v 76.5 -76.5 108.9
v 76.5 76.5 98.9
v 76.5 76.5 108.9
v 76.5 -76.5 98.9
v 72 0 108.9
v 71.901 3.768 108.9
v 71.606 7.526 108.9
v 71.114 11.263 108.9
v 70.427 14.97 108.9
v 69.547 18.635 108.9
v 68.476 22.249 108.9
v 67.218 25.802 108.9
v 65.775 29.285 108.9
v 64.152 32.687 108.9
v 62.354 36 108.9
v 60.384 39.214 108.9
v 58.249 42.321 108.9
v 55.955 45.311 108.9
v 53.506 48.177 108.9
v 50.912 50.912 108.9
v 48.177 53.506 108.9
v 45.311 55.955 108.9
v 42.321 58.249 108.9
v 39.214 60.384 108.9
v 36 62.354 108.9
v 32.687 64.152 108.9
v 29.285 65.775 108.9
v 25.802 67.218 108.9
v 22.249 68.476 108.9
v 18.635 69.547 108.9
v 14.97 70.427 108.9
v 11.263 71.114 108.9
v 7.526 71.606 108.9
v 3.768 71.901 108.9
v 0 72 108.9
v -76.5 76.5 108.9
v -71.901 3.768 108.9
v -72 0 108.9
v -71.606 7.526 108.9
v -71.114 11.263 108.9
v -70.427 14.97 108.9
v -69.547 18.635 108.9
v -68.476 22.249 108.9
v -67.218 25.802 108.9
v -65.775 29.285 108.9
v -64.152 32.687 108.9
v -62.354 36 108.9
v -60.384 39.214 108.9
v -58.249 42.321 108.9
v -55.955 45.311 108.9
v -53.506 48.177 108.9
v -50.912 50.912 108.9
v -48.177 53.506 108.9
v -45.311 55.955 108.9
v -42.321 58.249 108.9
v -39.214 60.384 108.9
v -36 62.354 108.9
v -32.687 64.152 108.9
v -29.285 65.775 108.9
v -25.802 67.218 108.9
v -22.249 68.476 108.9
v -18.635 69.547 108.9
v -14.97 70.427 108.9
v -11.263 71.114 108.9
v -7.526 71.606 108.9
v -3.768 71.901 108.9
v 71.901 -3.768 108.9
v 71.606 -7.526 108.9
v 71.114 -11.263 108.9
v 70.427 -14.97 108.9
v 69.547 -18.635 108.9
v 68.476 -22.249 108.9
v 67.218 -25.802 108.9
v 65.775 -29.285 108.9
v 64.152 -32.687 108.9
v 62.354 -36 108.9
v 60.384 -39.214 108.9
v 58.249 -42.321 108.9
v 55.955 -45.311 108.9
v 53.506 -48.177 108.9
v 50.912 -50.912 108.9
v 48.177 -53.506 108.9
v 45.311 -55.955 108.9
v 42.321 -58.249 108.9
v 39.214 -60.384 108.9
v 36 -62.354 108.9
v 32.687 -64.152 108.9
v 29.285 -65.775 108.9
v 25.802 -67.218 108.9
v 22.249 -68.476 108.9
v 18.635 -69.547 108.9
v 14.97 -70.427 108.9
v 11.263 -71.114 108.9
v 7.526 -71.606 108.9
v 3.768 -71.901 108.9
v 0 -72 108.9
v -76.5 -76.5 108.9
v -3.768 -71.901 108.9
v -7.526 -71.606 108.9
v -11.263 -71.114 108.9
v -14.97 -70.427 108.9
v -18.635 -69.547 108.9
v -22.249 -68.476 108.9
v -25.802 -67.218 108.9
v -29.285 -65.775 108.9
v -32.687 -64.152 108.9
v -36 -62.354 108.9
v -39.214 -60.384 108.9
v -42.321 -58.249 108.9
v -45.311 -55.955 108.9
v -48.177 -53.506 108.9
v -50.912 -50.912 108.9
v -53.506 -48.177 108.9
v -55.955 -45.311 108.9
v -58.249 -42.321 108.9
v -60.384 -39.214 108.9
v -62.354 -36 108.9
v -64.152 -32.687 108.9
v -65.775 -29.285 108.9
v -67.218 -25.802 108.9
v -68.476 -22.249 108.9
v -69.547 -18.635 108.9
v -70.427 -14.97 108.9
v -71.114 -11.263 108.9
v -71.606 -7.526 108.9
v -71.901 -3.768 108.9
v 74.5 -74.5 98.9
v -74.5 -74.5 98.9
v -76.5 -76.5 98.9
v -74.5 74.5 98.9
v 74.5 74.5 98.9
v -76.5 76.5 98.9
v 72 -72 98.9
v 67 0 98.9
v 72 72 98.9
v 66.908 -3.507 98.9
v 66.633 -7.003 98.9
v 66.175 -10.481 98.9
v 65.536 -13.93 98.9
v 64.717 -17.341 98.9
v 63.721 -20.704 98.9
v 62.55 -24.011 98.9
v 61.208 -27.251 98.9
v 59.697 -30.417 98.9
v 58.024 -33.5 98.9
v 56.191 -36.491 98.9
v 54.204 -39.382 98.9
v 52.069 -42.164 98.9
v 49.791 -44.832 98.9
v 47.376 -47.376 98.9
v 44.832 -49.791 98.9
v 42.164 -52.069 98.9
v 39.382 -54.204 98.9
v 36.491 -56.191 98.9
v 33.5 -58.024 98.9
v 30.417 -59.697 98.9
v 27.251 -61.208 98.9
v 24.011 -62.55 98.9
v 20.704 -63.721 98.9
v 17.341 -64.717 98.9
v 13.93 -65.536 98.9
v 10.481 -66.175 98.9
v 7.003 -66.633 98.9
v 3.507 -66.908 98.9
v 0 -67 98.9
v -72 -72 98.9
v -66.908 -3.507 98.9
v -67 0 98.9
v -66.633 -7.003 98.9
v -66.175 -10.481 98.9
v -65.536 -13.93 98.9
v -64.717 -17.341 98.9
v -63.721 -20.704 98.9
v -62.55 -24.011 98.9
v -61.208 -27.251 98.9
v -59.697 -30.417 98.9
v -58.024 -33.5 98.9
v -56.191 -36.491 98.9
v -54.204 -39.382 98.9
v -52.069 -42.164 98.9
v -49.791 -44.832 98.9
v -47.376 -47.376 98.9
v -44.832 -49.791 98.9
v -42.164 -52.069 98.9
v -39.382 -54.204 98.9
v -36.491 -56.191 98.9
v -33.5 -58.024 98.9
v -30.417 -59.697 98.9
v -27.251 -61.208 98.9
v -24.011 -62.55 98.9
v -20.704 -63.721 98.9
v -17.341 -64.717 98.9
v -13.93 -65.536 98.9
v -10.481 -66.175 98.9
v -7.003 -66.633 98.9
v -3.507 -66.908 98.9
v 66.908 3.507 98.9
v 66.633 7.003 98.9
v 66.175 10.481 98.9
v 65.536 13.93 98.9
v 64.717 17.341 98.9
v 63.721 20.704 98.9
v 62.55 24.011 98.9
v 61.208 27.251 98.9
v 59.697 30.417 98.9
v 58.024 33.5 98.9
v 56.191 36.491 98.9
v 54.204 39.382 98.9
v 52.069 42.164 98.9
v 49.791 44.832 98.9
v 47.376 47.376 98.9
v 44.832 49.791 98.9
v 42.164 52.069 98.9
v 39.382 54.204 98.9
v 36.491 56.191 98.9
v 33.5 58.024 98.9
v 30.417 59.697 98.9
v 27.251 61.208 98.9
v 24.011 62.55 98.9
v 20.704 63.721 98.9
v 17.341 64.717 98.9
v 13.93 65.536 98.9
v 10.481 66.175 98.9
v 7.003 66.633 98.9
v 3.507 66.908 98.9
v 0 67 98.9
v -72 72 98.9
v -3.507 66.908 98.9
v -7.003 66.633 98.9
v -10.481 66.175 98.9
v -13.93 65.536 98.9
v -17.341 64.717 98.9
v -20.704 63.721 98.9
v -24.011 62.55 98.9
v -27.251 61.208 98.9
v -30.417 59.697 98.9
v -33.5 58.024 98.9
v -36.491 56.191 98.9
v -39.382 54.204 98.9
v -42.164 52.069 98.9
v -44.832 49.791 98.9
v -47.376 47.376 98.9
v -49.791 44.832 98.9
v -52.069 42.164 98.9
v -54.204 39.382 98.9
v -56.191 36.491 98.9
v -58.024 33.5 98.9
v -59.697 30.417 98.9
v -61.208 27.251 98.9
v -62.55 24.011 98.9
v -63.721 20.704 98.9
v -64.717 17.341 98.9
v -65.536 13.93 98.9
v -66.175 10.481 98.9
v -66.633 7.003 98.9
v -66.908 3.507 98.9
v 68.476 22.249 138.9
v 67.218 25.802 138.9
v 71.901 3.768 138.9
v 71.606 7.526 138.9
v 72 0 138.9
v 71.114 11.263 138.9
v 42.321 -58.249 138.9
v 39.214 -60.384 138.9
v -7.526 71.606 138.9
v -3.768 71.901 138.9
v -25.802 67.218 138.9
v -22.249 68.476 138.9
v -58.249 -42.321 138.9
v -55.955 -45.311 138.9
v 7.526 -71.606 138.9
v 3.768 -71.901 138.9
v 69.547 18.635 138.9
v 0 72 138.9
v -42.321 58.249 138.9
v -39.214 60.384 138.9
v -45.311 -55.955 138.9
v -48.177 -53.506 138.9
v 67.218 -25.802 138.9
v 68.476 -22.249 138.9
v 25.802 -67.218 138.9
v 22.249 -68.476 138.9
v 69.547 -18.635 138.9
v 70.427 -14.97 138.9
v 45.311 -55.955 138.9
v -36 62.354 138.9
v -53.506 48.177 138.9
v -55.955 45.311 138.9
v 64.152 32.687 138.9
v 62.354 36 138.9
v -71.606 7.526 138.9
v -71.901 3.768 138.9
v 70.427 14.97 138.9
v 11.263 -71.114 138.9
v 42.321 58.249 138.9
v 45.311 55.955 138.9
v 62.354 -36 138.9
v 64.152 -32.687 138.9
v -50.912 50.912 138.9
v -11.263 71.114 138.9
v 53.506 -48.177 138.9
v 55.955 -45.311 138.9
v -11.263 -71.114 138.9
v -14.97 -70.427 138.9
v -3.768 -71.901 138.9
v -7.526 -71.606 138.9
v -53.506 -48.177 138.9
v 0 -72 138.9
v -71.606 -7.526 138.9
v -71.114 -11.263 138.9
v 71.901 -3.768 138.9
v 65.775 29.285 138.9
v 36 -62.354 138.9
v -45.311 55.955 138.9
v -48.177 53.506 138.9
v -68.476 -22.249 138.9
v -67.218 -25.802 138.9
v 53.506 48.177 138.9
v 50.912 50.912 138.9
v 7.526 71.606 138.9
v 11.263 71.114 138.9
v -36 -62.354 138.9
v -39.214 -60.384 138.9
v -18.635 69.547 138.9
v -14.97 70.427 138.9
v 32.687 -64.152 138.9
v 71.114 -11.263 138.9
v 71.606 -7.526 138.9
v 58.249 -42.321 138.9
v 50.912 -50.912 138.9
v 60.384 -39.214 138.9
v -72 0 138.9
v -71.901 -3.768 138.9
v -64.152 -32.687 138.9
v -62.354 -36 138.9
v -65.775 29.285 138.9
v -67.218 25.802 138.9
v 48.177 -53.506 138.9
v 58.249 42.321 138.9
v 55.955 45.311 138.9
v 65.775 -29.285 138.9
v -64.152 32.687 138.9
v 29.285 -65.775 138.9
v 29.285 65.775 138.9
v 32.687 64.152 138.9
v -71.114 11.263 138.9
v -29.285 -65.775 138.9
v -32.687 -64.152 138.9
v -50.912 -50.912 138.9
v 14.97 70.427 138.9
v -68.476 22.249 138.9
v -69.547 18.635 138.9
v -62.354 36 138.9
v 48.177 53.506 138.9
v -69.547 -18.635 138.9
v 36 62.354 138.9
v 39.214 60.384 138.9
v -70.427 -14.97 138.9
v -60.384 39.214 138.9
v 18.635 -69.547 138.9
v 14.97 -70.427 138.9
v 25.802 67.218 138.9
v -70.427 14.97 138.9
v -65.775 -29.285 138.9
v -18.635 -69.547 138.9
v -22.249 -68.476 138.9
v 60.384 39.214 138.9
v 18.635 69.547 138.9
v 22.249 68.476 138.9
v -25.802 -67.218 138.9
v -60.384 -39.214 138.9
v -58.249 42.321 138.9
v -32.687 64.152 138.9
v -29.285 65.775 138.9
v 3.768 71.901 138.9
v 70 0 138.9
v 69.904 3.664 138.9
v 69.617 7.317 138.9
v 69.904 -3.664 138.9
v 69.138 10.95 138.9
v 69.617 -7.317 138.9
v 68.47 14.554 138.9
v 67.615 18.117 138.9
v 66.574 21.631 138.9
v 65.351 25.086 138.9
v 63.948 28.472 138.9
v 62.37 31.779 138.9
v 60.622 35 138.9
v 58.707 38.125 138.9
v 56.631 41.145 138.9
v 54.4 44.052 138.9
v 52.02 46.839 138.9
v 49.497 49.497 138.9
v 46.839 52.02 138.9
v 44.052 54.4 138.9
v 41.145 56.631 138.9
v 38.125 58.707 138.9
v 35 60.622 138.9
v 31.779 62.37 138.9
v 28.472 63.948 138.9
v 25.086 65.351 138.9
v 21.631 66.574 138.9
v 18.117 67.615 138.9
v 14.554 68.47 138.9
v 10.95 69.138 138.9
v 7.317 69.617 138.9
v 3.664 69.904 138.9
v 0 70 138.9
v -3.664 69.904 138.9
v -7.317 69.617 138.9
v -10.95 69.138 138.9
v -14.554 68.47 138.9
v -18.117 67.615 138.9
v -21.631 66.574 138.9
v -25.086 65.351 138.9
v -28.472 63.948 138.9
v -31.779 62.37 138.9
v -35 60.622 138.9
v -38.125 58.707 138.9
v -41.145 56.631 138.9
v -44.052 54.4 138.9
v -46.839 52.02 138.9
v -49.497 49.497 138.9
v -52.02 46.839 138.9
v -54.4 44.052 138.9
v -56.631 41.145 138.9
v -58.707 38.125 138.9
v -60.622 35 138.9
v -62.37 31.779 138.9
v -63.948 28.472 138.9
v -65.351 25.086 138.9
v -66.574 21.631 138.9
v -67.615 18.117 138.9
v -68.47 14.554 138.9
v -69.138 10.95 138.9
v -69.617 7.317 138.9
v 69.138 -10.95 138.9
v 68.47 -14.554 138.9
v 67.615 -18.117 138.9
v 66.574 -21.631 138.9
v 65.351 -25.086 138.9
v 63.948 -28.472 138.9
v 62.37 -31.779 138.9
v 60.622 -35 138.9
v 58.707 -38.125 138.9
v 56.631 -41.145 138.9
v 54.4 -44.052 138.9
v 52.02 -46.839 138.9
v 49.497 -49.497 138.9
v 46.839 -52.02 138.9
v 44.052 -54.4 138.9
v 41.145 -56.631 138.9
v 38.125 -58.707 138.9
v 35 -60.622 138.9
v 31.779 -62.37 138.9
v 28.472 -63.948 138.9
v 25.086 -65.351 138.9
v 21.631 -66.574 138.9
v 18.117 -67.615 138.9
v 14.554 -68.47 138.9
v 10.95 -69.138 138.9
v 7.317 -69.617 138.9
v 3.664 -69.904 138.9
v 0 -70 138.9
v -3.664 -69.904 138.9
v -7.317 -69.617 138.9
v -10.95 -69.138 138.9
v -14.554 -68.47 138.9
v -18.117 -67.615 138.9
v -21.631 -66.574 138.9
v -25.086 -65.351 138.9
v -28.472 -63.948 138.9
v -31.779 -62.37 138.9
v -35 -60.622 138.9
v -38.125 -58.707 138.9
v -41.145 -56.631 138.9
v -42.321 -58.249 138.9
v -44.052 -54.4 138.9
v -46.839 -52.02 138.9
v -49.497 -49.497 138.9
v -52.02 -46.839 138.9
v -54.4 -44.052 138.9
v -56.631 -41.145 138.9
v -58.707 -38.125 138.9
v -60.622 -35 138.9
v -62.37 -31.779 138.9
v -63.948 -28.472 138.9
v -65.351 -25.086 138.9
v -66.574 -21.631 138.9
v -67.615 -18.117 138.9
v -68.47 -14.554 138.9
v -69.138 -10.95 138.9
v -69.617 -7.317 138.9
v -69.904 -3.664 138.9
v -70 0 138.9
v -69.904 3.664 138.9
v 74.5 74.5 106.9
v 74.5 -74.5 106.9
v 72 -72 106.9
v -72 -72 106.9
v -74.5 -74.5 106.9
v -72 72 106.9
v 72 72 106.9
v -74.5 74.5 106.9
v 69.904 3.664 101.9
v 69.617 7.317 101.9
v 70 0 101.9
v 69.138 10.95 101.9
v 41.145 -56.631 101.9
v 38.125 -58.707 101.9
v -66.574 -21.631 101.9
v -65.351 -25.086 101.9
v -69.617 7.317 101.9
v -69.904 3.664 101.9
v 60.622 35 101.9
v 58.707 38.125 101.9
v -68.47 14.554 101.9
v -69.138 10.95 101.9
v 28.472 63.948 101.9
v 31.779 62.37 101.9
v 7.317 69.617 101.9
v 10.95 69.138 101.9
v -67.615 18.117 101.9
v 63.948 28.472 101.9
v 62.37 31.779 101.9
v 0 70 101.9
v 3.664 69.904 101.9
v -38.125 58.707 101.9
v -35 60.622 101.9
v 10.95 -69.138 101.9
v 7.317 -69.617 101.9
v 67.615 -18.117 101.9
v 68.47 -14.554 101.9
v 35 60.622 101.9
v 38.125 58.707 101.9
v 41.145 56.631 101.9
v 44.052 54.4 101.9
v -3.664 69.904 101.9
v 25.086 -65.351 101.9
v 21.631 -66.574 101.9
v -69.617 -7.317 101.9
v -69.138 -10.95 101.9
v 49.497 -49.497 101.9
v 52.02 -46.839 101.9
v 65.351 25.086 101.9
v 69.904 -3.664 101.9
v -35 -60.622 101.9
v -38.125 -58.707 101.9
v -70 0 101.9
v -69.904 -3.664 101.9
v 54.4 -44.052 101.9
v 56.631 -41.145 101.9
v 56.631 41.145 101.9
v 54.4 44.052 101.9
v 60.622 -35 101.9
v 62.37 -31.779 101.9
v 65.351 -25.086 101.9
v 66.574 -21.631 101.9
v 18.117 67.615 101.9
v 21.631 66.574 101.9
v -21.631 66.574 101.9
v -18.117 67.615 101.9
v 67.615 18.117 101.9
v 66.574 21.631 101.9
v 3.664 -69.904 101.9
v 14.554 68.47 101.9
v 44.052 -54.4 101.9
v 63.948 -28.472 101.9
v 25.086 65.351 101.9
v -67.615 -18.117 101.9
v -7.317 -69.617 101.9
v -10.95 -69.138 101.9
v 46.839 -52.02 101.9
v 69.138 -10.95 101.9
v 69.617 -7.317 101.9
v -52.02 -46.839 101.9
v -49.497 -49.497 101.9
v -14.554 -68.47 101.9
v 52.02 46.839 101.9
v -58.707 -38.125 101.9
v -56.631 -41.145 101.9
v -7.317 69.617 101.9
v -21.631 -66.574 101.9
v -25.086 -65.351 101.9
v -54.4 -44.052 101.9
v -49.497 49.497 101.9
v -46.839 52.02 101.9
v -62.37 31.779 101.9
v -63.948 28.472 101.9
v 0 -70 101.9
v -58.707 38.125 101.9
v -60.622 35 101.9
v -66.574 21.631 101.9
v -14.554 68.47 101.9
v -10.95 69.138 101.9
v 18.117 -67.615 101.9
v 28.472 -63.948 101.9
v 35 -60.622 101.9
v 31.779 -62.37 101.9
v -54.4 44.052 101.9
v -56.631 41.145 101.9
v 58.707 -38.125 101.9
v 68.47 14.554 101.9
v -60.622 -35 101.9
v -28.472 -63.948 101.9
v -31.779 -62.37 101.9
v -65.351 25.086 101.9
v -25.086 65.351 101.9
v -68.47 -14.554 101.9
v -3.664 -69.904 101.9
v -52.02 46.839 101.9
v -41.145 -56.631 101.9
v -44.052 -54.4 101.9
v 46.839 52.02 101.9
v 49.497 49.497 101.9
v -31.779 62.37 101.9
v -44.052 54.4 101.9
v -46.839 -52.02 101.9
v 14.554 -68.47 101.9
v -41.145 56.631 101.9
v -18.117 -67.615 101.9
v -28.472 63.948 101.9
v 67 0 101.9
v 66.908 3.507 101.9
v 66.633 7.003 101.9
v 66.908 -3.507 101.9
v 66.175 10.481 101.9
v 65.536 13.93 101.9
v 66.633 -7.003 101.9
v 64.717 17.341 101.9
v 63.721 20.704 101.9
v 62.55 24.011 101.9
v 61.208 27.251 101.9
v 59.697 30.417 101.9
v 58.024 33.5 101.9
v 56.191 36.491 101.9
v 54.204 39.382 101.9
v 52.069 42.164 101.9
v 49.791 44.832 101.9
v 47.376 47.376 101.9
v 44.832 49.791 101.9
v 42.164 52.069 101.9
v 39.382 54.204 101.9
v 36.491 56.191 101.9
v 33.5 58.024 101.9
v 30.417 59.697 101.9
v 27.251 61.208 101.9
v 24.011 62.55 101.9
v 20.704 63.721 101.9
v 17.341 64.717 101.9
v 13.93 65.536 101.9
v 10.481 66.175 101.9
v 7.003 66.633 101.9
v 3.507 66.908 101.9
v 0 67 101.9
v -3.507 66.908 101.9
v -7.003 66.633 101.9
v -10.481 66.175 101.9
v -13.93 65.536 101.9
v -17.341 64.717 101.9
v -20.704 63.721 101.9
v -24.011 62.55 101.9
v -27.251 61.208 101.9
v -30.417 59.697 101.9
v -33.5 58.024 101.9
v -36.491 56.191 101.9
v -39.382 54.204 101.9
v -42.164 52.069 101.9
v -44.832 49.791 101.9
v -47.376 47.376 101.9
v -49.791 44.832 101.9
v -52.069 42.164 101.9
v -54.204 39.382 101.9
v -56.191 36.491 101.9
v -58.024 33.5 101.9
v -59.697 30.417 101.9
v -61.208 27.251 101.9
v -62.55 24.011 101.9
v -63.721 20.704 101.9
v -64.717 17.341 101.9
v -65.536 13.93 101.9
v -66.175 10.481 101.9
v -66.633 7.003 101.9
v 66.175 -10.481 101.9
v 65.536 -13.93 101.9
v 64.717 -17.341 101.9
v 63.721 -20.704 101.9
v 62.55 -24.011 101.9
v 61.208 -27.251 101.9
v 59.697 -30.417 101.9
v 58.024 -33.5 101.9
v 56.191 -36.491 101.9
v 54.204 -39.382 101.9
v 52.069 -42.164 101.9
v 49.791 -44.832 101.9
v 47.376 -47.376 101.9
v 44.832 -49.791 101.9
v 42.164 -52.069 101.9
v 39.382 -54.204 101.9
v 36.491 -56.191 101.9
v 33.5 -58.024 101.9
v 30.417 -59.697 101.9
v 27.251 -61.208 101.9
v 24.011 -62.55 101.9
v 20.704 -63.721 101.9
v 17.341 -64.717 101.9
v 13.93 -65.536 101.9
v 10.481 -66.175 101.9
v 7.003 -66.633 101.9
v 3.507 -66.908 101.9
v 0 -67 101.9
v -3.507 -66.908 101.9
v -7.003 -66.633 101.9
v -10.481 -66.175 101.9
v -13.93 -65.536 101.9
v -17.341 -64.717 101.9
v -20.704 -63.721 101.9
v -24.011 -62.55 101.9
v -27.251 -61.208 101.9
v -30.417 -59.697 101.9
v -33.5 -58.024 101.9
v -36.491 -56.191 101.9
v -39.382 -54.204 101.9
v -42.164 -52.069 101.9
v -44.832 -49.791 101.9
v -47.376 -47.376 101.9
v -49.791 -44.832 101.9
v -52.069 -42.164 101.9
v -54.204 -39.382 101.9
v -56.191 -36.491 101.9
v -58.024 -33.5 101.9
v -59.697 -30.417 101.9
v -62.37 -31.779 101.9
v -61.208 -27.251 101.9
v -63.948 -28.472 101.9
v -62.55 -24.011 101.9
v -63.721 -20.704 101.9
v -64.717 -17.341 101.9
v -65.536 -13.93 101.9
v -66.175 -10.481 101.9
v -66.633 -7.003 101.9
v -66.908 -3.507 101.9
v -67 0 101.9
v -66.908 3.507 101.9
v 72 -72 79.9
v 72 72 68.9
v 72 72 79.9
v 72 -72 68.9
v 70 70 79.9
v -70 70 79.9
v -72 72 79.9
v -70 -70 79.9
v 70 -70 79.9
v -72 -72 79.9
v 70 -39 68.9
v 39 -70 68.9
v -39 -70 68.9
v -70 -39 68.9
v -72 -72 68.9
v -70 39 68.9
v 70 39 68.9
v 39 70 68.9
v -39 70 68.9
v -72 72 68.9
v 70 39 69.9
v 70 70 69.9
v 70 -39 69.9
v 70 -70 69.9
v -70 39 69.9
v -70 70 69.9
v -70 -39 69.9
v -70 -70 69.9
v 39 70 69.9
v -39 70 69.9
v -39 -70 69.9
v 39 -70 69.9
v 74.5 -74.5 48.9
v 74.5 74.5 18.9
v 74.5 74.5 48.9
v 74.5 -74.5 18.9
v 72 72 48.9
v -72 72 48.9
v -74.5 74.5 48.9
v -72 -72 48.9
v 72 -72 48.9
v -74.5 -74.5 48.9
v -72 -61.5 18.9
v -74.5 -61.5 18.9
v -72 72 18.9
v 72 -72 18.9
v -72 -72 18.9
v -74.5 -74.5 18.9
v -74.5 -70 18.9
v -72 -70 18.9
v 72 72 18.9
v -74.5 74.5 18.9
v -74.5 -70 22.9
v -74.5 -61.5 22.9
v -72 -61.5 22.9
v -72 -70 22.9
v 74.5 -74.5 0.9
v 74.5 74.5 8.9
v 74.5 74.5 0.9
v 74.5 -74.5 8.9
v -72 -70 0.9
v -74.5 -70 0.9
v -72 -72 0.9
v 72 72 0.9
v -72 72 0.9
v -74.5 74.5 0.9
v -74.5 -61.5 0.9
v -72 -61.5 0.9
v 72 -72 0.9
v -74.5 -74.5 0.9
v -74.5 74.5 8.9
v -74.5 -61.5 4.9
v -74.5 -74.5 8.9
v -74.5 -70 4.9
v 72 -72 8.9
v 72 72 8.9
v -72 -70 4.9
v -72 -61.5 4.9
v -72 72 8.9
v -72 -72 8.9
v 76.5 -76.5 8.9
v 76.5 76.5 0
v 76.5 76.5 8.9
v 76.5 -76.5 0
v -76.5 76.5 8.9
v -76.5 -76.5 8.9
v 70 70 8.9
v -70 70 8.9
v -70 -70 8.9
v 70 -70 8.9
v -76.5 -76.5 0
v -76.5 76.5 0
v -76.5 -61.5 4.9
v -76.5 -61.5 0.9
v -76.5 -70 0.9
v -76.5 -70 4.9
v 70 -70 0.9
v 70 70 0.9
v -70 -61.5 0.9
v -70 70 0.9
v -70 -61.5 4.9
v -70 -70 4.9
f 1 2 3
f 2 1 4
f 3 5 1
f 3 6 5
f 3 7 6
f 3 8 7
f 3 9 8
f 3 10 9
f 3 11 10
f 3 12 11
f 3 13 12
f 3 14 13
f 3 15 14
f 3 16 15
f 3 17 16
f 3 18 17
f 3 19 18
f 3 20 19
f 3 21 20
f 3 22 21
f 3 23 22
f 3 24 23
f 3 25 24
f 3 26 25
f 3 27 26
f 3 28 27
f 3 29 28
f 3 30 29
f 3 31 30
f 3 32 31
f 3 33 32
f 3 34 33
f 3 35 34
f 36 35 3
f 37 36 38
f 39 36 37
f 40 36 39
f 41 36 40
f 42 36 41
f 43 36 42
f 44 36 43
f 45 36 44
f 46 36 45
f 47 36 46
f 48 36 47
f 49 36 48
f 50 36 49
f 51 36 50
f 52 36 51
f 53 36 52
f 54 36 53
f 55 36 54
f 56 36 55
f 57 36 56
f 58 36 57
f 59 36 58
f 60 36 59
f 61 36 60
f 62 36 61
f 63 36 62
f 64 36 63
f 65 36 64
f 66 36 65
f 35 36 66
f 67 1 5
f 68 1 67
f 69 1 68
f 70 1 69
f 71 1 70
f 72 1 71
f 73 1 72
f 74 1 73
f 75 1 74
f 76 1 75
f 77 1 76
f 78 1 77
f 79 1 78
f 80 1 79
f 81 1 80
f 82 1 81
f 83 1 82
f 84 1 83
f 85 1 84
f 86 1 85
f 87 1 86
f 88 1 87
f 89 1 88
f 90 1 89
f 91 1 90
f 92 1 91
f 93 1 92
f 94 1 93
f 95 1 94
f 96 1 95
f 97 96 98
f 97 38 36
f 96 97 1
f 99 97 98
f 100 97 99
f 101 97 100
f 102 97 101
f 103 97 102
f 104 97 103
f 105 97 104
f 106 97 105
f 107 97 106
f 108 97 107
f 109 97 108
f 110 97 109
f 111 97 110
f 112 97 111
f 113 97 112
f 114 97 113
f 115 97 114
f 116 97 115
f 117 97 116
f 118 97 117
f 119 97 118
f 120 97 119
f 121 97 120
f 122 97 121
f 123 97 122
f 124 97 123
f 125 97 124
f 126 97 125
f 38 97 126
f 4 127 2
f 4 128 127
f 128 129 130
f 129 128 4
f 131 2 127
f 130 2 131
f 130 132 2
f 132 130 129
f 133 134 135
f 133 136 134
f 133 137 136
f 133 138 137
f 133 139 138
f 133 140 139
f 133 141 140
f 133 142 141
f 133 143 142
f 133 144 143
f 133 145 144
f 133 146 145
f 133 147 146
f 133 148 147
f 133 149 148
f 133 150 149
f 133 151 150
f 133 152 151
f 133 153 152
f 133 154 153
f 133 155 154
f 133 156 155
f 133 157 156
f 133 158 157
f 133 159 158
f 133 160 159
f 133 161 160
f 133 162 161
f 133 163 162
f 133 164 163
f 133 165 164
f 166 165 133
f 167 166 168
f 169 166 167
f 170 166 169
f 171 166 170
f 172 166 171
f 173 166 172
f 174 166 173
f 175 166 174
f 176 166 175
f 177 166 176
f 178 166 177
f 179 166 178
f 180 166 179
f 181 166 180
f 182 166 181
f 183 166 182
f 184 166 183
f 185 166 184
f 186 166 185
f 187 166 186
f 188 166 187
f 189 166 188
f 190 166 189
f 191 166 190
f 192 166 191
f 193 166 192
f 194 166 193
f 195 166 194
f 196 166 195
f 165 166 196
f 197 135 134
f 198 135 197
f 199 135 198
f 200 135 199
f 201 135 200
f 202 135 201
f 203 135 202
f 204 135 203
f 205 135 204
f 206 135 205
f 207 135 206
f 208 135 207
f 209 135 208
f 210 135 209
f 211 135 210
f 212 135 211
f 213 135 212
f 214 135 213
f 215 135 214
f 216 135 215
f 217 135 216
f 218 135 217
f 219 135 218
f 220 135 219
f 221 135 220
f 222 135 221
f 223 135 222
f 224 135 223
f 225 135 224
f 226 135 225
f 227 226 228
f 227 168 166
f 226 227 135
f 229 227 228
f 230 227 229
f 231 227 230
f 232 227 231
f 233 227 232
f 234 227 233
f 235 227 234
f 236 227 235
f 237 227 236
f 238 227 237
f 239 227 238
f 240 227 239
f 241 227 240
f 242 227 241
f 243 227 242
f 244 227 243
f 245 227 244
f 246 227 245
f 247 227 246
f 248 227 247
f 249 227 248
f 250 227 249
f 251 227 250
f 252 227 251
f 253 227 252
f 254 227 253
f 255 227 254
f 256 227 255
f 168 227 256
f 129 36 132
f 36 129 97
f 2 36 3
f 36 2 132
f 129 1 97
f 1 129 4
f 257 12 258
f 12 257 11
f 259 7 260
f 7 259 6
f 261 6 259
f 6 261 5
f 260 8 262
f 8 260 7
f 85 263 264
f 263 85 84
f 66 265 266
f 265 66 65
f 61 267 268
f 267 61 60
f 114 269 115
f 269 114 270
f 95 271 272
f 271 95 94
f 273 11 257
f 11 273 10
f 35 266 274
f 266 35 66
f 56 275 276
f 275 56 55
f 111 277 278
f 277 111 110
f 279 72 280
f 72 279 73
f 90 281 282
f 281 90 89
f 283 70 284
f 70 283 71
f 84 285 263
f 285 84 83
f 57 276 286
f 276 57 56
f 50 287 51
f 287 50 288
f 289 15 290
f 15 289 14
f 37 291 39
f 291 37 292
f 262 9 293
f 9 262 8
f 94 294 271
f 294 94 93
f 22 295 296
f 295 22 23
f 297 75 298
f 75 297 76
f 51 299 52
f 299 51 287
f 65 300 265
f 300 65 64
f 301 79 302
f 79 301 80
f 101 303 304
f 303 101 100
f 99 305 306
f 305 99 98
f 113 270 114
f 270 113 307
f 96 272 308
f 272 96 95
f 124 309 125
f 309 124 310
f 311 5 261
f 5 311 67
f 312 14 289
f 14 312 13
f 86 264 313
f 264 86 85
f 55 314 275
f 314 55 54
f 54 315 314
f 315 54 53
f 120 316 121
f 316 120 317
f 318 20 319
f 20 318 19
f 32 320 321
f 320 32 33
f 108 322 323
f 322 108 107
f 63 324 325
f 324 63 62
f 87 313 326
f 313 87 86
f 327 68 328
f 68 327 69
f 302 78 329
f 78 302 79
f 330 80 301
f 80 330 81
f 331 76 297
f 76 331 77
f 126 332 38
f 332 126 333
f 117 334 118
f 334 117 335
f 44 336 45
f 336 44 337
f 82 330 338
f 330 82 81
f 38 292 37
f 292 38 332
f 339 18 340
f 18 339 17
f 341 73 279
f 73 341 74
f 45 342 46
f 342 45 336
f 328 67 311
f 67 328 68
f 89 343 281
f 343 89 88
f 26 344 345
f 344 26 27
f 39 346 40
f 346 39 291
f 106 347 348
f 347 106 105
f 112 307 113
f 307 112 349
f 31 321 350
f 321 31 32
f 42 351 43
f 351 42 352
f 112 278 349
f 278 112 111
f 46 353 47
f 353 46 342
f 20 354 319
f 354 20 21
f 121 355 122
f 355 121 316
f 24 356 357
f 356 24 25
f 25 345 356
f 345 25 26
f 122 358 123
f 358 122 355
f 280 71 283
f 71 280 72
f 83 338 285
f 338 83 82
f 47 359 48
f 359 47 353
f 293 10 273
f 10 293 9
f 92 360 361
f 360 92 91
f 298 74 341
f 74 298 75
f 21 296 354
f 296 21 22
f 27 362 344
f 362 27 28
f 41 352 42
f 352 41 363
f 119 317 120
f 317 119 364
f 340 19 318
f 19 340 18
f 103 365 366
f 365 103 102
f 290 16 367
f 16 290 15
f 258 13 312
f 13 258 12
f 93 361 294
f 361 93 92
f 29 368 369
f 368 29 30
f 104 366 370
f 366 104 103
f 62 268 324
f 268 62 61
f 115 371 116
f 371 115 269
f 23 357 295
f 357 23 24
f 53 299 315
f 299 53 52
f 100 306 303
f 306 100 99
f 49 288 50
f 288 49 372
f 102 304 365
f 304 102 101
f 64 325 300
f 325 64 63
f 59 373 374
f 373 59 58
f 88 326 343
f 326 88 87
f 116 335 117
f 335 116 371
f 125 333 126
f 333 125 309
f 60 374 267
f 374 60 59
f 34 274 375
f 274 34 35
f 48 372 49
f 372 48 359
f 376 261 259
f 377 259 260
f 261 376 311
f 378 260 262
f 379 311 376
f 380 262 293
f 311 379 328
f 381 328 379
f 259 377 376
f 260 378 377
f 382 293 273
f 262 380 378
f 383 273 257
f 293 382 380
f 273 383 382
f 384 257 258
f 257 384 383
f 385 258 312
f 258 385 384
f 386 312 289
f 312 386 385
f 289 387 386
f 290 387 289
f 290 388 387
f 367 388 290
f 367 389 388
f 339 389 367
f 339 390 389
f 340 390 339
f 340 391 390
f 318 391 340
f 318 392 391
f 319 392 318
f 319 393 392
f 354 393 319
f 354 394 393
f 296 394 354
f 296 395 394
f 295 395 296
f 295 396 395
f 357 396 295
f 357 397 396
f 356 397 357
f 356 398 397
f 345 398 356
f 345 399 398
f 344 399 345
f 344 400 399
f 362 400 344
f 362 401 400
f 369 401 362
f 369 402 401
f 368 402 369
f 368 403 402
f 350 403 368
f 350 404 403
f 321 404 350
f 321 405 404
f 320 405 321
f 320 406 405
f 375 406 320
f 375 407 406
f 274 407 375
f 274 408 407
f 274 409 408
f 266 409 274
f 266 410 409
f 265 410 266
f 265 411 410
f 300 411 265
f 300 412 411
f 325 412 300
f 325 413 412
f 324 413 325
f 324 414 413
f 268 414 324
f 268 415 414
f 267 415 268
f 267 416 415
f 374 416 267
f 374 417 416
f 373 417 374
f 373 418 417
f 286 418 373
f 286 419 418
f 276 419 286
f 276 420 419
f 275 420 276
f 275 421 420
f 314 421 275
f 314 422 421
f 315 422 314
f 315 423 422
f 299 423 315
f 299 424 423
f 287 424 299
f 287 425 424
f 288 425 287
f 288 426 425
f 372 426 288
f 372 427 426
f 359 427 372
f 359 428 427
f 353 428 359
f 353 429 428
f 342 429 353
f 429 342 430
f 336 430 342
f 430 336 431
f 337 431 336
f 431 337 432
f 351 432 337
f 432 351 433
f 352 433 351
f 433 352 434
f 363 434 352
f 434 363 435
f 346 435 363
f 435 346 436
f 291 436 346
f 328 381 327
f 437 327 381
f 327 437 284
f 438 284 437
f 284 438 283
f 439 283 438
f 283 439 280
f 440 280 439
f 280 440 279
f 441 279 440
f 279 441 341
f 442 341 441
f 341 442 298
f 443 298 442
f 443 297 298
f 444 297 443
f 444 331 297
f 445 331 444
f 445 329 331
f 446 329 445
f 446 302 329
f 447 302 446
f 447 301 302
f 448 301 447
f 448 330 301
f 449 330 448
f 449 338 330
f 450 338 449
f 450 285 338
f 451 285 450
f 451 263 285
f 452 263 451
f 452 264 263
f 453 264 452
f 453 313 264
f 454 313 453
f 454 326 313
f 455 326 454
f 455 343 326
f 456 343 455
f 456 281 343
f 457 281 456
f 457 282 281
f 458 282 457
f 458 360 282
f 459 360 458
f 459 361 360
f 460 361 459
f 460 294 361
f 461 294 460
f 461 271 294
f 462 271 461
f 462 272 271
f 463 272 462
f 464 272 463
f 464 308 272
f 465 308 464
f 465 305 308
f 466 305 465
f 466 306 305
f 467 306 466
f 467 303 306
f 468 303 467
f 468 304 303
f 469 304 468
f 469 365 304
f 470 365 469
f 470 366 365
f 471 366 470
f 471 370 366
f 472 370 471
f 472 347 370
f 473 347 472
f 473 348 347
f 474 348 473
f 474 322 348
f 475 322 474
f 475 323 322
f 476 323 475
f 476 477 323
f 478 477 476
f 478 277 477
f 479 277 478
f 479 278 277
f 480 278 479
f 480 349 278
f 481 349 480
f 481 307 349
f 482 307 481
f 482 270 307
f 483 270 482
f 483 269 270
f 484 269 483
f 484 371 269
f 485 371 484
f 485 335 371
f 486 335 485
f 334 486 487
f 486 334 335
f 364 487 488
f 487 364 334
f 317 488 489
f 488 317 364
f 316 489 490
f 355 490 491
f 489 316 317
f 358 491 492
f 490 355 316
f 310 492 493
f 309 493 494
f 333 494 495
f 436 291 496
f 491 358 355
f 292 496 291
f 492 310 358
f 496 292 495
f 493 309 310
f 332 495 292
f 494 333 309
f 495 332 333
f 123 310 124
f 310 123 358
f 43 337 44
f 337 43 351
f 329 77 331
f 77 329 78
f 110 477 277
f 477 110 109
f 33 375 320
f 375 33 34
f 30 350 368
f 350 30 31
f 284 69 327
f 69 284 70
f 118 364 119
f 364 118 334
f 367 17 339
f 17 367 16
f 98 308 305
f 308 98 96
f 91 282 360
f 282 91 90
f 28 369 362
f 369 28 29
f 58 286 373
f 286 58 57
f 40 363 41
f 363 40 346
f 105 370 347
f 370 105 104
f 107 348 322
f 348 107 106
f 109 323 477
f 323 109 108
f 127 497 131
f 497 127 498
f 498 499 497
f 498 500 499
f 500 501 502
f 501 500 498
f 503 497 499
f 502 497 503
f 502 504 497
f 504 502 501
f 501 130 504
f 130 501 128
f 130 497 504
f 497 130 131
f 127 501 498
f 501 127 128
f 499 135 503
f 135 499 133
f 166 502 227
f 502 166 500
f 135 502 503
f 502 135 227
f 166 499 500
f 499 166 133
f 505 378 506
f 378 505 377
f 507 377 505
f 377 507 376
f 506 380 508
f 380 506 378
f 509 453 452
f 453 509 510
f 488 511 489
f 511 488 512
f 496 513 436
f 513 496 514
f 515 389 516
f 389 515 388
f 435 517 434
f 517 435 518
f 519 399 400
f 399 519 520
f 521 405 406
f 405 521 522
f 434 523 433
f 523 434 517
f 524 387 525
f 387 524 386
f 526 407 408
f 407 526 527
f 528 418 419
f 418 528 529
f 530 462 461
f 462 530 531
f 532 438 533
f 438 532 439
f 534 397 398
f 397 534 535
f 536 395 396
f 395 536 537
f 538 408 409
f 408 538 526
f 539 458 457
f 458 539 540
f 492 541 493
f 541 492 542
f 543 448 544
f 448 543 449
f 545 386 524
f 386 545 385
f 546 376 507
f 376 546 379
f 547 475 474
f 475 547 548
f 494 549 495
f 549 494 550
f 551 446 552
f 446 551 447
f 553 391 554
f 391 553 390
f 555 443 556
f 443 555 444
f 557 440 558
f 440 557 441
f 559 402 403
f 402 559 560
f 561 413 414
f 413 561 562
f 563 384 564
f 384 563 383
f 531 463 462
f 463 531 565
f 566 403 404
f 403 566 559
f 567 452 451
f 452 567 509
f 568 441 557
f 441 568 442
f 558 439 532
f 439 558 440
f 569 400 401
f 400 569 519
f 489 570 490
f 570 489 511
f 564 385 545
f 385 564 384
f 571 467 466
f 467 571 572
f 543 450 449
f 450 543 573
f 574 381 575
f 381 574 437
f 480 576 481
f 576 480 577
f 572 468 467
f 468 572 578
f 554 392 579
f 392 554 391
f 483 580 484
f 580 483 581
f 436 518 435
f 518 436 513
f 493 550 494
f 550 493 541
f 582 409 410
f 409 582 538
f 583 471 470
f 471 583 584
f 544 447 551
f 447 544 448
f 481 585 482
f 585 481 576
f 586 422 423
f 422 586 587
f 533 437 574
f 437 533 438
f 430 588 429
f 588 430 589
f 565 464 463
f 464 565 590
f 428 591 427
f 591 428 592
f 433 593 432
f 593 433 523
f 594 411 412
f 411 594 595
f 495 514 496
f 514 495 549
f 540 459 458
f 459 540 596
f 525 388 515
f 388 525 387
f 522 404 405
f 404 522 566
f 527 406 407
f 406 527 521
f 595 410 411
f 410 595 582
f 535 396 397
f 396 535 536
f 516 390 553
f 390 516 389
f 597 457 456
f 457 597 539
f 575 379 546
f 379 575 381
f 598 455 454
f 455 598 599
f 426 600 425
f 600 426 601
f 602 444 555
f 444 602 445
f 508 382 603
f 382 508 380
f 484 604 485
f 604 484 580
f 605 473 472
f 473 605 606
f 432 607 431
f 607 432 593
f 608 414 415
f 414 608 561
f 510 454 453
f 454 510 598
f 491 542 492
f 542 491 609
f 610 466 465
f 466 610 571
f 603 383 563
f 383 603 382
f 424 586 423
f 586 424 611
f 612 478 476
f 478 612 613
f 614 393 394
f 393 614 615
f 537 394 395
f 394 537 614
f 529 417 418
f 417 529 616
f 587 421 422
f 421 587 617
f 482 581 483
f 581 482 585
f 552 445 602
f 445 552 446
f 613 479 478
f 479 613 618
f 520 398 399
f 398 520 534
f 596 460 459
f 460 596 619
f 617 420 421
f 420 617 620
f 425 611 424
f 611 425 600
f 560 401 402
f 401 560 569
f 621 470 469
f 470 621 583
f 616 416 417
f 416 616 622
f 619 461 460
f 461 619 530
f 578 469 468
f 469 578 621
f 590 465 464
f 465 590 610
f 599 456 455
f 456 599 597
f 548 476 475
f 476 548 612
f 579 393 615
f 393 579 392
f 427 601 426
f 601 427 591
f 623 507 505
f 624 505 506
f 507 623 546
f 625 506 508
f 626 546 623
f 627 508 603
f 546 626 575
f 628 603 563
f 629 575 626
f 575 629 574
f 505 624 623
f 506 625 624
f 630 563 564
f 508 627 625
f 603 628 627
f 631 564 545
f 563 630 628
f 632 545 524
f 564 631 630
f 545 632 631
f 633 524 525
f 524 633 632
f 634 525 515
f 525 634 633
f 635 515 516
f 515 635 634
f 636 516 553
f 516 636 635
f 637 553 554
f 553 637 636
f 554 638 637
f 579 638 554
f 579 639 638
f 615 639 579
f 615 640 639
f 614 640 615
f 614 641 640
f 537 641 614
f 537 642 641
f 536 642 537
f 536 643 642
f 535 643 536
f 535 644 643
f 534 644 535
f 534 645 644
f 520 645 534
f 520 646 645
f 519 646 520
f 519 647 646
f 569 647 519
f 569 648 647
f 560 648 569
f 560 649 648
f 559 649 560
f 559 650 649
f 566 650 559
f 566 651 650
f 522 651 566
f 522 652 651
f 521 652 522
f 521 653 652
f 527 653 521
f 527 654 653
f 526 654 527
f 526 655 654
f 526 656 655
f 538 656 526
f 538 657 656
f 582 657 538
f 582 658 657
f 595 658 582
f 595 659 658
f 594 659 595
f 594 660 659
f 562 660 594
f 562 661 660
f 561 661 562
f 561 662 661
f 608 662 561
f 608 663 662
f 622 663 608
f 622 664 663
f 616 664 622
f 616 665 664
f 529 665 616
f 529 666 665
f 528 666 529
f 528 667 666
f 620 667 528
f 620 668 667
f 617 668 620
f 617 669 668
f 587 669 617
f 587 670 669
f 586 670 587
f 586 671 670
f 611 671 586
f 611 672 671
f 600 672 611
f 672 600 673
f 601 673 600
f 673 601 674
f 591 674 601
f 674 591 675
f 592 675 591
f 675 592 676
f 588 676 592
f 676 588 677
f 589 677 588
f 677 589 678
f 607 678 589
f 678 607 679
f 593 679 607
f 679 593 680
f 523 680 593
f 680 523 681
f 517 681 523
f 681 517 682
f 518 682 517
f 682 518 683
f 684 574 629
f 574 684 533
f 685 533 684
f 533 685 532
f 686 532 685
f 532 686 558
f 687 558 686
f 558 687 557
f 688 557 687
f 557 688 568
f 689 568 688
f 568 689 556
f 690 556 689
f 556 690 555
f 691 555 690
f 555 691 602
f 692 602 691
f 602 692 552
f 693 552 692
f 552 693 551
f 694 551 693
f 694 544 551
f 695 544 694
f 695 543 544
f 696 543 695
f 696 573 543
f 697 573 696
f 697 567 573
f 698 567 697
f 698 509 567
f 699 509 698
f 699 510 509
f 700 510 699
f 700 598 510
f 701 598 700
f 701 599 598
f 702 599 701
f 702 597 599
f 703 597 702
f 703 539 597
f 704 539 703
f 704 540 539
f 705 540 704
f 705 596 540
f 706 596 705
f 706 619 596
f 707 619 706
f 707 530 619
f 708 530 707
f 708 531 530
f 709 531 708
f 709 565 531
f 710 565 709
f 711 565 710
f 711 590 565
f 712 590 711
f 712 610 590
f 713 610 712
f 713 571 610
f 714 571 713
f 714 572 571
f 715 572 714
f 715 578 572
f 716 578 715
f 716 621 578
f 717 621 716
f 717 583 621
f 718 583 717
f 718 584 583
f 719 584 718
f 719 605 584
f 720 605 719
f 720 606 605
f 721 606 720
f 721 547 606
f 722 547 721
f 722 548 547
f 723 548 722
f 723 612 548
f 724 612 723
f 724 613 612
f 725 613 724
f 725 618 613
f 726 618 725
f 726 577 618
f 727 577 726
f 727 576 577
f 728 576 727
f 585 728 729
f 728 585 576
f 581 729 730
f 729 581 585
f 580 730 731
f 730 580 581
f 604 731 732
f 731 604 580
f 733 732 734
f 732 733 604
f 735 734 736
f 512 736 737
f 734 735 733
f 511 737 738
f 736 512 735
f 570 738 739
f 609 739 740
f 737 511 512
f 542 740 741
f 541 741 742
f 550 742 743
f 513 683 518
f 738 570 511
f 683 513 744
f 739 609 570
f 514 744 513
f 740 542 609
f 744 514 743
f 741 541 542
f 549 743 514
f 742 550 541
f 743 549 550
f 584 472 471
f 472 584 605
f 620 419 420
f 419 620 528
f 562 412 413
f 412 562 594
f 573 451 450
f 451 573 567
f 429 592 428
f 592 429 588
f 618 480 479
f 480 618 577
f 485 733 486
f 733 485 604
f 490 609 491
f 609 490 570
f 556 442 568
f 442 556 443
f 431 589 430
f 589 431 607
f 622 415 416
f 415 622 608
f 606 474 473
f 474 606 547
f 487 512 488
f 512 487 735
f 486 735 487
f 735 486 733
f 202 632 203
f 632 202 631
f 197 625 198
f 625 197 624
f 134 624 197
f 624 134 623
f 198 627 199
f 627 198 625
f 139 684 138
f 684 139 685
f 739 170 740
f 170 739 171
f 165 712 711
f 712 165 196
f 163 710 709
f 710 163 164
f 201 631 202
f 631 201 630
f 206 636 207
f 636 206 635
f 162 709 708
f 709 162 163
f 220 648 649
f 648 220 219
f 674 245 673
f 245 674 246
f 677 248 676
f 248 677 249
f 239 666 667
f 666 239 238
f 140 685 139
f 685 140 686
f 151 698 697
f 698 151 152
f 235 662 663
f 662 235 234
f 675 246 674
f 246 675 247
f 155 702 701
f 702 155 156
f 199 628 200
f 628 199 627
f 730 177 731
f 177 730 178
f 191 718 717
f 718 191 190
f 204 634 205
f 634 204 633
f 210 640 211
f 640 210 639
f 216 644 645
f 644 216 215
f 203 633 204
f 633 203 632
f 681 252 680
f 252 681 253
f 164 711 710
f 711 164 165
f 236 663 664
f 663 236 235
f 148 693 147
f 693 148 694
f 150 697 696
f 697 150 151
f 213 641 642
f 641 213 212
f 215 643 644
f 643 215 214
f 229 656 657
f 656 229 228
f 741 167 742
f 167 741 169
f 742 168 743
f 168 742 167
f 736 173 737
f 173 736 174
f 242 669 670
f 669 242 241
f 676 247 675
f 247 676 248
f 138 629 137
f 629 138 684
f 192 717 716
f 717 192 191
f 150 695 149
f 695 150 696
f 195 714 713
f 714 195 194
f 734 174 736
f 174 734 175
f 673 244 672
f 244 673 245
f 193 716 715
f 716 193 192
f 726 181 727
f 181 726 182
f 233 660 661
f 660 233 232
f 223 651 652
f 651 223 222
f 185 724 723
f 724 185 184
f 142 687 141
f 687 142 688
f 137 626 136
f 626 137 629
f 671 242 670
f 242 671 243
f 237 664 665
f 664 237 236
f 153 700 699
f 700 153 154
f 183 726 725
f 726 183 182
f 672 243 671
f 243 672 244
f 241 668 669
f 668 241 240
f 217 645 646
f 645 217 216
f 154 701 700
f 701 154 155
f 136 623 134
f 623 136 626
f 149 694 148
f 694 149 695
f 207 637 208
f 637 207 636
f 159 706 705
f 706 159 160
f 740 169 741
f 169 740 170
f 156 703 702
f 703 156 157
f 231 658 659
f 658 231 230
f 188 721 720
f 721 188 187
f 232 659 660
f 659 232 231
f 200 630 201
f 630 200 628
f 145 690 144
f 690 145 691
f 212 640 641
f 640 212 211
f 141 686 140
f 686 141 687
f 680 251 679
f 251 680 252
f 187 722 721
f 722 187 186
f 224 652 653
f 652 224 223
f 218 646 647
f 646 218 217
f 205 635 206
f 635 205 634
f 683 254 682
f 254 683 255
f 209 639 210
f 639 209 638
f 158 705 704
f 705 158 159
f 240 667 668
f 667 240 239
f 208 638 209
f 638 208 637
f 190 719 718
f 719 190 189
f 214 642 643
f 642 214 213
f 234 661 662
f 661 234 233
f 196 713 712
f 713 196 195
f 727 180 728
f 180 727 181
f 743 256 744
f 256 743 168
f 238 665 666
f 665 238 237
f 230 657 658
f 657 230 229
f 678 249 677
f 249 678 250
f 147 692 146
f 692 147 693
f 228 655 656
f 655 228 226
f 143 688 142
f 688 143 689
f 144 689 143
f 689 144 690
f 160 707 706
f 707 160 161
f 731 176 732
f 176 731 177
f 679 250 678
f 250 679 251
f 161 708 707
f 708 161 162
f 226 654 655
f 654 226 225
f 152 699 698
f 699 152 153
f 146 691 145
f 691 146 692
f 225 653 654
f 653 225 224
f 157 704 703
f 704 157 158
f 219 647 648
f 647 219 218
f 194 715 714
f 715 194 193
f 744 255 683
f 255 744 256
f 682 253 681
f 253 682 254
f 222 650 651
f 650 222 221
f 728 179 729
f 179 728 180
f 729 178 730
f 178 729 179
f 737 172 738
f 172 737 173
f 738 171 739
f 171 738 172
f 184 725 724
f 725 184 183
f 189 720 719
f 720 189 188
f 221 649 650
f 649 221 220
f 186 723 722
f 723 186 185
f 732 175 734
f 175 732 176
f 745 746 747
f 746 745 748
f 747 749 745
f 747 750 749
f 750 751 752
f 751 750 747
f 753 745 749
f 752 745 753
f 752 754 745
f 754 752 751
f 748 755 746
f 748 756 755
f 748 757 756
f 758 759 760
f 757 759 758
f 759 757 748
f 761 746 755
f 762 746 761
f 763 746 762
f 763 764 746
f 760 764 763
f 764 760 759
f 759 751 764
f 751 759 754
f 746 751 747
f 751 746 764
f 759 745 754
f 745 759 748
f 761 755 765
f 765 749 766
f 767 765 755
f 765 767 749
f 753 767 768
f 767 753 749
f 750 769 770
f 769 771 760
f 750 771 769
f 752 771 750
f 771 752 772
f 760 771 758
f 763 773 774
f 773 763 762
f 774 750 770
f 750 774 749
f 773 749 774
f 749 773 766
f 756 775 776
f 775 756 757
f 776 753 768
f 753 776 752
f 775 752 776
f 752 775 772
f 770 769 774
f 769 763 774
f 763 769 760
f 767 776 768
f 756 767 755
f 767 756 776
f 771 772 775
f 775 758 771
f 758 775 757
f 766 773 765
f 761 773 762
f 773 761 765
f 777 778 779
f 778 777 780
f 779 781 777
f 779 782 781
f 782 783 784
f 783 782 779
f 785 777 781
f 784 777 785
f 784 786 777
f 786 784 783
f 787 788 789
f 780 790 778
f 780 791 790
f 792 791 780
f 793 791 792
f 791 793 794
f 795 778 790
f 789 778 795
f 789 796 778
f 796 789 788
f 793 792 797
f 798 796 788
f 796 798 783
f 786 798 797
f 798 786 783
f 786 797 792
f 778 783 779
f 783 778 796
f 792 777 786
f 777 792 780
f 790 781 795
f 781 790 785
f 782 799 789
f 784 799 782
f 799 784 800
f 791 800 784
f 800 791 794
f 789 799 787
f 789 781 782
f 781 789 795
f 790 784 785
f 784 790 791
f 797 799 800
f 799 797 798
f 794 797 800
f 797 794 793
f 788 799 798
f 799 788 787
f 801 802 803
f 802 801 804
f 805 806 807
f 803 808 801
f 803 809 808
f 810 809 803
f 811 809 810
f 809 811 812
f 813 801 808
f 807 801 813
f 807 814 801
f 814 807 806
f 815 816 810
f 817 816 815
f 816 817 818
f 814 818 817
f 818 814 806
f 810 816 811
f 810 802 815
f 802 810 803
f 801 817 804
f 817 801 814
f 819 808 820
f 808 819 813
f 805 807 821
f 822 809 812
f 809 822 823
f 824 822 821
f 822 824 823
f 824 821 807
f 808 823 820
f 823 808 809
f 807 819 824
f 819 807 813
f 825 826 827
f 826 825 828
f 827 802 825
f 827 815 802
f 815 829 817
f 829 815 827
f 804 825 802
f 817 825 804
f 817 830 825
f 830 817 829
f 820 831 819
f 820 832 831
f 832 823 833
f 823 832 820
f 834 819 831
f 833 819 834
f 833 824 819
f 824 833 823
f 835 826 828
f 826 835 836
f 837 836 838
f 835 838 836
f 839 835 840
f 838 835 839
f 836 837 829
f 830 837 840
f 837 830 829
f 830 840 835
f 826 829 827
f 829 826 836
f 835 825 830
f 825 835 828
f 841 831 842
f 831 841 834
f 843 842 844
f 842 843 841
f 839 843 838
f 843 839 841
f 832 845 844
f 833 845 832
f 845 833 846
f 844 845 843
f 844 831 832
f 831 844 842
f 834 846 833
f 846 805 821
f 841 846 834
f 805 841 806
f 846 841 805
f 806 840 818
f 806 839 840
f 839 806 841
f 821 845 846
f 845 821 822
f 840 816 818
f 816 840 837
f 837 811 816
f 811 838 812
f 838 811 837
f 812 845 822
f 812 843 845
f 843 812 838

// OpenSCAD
// Flat Box by JoJoNeiL
// English Version
// Last Rev = 21 oct. 2016
// Creative Commons - Attribution - Non-Commercial license.
// http://www.thingiverse.com/jojoneil/about
// www.jojoneil.net



// ---
// --- TO BE CUSTOMIZED
// ---

// --- FOOT
// number of sides for the cylinder (more sides will make it smooth, but it will increase the rendering time)
Smooth =       120; 


// outside diameter of dewshield
CylDia =       140;
// Height of the cylinder
CylHt =        30; 
// Thickness of the cylinder
CylThick =      2; 
// Height of the stopper
StopHt =        3; 
// Thickness of the stopper
StopDia =       3; 
// Height of the box
BoxHt =         10;
// Width of the trench for the walls
Trench =       2.5; 
// Thickness of the walls around the trench
WallT =           2; 



// --- ROOF
// width of the supply socket
AlimW =       8.5;
// Height of the supply socket
AlimHt =        4; 
// Height above the supply socket
RoofHt =        2; 
// Thickness of the roof
RoofTk =       0.9; 


// --- PLEXIGLASS HOLDER
// Thickness of the 4 holders
HoldersT =      1; 
// Height of support walls (in addition of the Thickness of the 4 holders)
SpWallHt =      10; 


// --- SIDES
// Height of the sides
SidesHt =      30; 

// ---
// ---END OF CUSTOMIZATION
// ---









// ---
// --- DONT TOUCH
// ---

// Définition de la taille externe de la boite
// BODY CREATION OF 1st PIECE
// (rayon du tube + épaisseur du mur + taille du trou pour les parrois + épaisseur du mur)x2
Body = CylDia+(2*Trench)+(WallT*4); 

// Variable : taille totale en hauteur plafond
// TOTAL HEIGHT OF THE ROOF
HtG = RoofTk+AlimHt+RoofHt+WallT;

roof = CylDia;

// MODULE DE CREATION DE MUR
// WALL CREATION MODULE
// mur(Hauteur, Taile interieure, Taille exterieure) 
module mur(ht, int, ext) {
  difference() {
    translate([-ext/2,-ext/2,0]) cube([ext,ext,ht]);
    translate([-int/2,-int/2,-1]) cube([int,int,ht+2]);
  }
}


// MODULE DE CREATION DE TRIANGLE
// MODULE TO EXTRUDE TRIANGLE
// chanfreinprepa(Largeur triangle, hauteur triangle);
module chanfreinprepa(size,ep){
    translate([0,-size,0]){
        difference(){
            cube([size,size,ep]);
            rotate([0,0,-45]) translate([0,0,-1]) cube([size*2,size*2,ep+2]);
        }
    }
}


// MODULE DE CREATION DE CHANFREIN sur 4 cotés
// chanfrein(taille générale,taille du chanfrein,hauteur chenfrein)
module chanfrein(sizegen,size,ep){
    rotate([0,0,0]) translate([-sizegen/2,sizegen/2,0]) chanfreinprepa(size,ep);
    rotate([0,0,180]) translate([-sizegen/2,sizegen/2,0]) chanfreinprepa(size,ep);
    rotate([0,0,90]) translate([-sizegen/2,sizegen/2,0]) chanfreinprepa(size,ep);
    rotate([0,0,-90]) translate([-sizegen/2,sizegen/2,0]) chanfreinprepa(size,ep);
}


// ---
// ---









// ---
// --- définition de la piece PIED
// --- FOOT PART
// ---
translate([0,0,HtG+SidesHt+SpWallHt+50]){
    difference(){
            union(){
                //Création de la boite principale
                translate([-Body/2,-Body/2,0]) cube([Body,Body,BoxHt]);
                // Cylindre exterieur (pour créer le rebord du cylindre qui s'emboite autour du pare buée)
                translate([0,0,BoxHt]) cylinder(h=CylHt,d=CylDia+(CylThick*2),$fn=Smooth);
                // Cylindre pour créer la butée
                cylinder(h=StopHt,d=CylDia-StopDia,$fn=Smooth);
            }
            // Cylindre intérieur pour créer trou du Ø du pare buée en donnant la hauteur de la butée)
            translate([0,0,StopHt]) cylinder(h=CylHt*2,d=CylDia,$fn=Smooth);
            // Cylindre trou du Ø de la butée
            translate([0,0,-1]) cylinder(h=BoxHt+2,d=CylDia-(StopDia*2),$fn=Smooth);
            // Création d'un trou pour installer les parois (avec une marge qui récupère l'épaisseur des "murs" autour du trou (WallT) entre les trous parois et le Ø du pare buée)
            translate([0,0,-2]) mur(BoxHt, CylDia+(WallT*2), CylDia+(2*Trench)+(WallT*2));
     }
}    
// ---




// ---
// --- Création de support de plaque plexi
// --- PLEXIGLASS HOLDER PART
// ---
translate([0,0,HtG+SidesHt+30]){
        // création d'un mur qui va frotter les 4 parois
        mur(HoldersT+SpWallHt,CylDia,CylDia+(WallT*2));
        // création de 4 triangles pour supporter la plaque
        chanfrein(CylDia+(WallT*2),CylDia/4,HoldersT);
}

// ---






// ---
// --- Création des parois
// --- SIDES PART
// ---
 translate([0,0,HtG+10]){
    rotate(0,180,0){
         // Créations de murs
        difference(){
        mur(SidesHt, Body-((2*Trench)+(WallT*2)),Body-(WallT*2));
        translate([-roof/2+1,-roof/2,-1]) mirror() cube([Trench+(WallT*2)+2,AlimW,AlimHt+1]);
        }
    }
}
// ---

 



// ---
// --- PIECE COUVERCLE
// --- ROOF PIECE
// ---
translate([0,0,0]){
    difference(){
        
        // création de la boite
        translate([-Body/2,-Body/2,0]) cube([Body,Body,HtG]);
        //création du trou central 
        translate([-roof/2,-roof/2,RoofTk]) cube([roof,roof,HtG]);
        // Création des murs pour inserrer les parois
        translate([0,0,RoofTk]) mur(BoxHt, CylDia+(WallT*2), CylDia+(2*Trench)+(WallT*2));
        // Création du trou pour passer l'alimentation
        translate([-roof/2+1,-roof/2,RoofTk]) mirror() cube([Trench+(WallT*2)+2,AlimW,AlimHt]);
    }
}
// ---
